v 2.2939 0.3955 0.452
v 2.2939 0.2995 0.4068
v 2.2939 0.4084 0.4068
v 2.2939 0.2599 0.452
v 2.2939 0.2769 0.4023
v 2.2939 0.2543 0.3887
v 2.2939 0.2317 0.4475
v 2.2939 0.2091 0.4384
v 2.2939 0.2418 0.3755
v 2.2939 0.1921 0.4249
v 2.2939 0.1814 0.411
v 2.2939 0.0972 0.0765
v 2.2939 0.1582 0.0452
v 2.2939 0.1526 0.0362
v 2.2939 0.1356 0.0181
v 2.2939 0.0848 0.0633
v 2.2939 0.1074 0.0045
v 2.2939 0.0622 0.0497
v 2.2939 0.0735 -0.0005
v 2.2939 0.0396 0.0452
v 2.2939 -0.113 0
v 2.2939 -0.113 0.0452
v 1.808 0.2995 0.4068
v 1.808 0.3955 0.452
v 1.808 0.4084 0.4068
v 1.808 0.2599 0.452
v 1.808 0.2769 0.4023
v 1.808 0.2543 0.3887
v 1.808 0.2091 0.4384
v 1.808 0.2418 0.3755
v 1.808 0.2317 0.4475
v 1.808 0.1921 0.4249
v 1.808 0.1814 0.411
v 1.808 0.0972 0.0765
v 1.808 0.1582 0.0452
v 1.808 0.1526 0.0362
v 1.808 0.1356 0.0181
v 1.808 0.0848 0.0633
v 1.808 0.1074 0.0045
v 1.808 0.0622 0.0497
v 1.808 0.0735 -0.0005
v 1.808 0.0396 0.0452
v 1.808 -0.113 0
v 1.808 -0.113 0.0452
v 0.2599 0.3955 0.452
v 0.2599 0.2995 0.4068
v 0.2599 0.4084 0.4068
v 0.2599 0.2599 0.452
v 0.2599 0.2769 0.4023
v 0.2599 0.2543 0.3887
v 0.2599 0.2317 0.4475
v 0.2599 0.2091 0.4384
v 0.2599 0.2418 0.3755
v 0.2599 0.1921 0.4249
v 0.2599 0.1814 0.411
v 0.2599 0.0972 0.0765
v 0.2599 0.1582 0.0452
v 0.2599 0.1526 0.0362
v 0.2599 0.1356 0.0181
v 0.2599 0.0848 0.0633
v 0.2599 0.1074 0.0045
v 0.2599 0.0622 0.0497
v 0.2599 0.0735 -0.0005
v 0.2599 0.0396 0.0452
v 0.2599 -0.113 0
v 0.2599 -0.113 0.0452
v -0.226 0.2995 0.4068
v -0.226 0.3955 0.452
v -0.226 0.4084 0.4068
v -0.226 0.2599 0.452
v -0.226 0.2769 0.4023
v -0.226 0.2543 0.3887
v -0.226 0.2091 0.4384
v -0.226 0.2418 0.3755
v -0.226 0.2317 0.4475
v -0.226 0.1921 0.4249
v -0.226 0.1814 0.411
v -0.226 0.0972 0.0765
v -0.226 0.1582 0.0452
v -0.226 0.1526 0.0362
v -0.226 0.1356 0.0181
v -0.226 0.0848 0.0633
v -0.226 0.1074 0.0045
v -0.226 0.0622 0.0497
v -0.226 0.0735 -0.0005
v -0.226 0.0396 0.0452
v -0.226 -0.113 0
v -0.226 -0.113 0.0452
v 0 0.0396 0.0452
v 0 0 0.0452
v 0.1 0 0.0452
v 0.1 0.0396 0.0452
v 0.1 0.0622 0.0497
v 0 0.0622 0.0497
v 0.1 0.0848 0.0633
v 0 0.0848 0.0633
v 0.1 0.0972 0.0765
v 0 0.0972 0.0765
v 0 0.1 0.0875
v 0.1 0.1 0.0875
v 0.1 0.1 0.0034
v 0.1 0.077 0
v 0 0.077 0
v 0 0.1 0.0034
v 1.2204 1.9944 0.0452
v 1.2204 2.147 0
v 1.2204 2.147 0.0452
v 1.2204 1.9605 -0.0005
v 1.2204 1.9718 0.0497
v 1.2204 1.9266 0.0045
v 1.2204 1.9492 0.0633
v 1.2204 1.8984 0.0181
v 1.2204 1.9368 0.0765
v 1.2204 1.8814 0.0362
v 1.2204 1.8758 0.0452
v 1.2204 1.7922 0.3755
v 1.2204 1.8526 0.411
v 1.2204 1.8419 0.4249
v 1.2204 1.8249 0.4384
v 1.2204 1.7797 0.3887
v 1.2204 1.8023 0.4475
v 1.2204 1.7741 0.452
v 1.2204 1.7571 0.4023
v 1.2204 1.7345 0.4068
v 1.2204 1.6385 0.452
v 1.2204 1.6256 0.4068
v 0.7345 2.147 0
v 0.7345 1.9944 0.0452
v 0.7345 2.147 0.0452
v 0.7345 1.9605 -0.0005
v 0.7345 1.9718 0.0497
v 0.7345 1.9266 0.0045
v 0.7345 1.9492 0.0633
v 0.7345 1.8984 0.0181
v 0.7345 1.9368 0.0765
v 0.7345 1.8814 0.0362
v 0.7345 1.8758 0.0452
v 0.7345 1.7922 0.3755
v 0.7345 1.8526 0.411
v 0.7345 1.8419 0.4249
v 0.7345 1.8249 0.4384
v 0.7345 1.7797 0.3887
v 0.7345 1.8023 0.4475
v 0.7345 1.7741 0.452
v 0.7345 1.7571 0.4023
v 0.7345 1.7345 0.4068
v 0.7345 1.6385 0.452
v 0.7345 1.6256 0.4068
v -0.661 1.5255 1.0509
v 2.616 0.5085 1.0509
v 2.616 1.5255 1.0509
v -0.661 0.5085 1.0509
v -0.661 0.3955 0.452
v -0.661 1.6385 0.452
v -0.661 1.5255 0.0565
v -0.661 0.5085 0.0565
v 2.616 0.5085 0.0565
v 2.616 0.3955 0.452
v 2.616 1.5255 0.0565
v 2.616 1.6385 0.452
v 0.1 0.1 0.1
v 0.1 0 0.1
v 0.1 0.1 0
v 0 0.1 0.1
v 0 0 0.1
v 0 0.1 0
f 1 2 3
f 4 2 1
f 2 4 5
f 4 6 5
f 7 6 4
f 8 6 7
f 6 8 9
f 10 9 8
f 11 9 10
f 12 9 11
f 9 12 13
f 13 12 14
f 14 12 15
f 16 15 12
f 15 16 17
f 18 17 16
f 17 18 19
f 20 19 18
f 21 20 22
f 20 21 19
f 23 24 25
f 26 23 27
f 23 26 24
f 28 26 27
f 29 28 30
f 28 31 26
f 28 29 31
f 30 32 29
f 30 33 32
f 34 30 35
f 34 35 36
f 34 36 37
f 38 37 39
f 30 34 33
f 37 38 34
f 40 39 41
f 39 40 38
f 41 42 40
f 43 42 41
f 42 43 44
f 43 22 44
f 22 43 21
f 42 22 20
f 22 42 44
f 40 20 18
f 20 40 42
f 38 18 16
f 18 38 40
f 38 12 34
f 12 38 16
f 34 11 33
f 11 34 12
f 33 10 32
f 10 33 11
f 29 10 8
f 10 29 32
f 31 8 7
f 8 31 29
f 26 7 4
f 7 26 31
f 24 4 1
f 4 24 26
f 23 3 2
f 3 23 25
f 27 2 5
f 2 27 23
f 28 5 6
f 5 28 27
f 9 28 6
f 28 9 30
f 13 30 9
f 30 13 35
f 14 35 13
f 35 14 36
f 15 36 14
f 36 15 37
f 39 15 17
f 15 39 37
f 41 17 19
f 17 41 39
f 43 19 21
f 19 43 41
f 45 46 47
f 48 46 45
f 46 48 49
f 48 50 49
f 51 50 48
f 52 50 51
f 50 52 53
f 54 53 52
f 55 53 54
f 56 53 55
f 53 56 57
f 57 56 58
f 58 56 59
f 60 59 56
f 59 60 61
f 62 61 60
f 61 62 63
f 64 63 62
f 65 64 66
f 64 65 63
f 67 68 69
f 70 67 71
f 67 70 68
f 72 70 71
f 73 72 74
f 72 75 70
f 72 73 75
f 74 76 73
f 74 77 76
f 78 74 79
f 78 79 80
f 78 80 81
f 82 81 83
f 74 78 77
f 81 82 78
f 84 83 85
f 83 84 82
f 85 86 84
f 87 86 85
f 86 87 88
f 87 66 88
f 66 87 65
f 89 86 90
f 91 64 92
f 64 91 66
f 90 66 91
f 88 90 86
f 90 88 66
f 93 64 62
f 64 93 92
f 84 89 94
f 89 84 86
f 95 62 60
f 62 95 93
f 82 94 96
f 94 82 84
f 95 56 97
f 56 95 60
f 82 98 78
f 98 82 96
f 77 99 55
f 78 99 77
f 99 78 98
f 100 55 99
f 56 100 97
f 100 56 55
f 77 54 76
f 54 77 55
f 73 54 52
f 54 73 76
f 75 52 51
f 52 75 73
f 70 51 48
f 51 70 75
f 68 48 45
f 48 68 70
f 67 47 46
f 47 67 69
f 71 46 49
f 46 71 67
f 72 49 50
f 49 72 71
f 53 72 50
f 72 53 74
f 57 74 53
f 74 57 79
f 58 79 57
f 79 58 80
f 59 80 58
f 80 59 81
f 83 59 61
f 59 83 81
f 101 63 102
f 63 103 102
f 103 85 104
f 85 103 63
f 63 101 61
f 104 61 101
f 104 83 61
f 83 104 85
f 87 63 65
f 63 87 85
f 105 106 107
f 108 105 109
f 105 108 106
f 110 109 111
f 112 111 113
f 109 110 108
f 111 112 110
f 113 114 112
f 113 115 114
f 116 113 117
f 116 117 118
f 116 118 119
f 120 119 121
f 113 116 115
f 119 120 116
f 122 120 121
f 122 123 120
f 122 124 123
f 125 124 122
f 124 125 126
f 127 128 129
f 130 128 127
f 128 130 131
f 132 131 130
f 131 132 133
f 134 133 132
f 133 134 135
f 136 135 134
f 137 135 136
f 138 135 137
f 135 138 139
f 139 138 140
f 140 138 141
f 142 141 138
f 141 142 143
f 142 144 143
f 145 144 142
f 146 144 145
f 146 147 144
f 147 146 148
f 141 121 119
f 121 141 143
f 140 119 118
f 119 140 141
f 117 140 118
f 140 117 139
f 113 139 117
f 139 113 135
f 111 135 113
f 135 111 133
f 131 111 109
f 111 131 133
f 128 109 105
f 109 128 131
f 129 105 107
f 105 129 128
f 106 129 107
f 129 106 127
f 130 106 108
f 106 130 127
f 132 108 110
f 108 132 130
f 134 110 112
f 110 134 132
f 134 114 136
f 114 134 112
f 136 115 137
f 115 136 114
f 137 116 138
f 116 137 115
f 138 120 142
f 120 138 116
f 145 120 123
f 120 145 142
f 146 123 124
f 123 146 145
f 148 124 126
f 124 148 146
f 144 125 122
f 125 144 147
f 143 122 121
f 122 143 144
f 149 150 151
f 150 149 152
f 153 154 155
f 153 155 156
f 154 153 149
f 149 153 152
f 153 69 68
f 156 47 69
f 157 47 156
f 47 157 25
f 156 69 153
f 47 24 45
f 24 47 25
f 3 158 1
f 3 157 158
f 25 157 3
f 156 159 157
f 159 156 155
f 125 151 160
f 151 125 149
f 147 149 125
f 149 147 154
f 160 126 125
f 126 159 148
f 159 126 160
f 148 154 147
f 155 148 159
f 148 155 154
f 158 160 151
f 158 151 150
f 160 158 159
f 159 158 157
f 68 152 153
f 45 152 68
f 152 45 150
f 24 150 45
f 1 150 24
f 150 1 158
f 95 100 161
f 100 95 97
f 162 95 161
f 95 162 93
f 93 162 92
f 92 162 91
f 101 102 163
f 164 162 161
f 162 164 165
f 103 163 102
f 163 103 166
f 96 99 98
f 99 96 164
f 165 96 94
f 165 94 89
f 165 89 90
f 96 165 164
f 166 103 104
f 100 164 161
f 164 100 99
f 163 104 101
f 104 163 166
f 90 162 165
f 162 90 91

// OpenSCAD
module sot23()
{

	// pin prototype
	module pin(length, height, thick)
	{
		linear_extrude(height=thick)
			scale([length, -height, 1])
				polygon([[0.3400,0.0000],[0.3900,0.0100],[0.4300,0.0300],[0.4600,0.0600],[0.4789,0.0908],[0.6279,0.8307],[0.6500,0.8600],[0.6900,0.8900],[0.7300,0.9000],[1.0000,0.9000],[1.0000,1.0000],[0.6700,1.0012],[0.6100,0.9900],[0.5600,0.9600],[0.5300,0.9200],[0.5200,0.9000],[0.3721,0.1693],[0.3500,0.1400],[0.3100,0.1100],[0.2700,0.1000],[0.0000,0.1000],[0.0000,0.0000]]);
	}

	rotate([90,0,-90]) scale([1.13,1.13,1.13]) translate([-0.9, 0.4, -2.1 - 0.43/2]) {
		// body
		color([0.1,0.1,0.1])
			linear_extrude(height=2.9)
				polygon([[-0.55,0],[-0.45,0.53],[0.45,0.53],[0.55,0],[0.45,-0.35],[-0.45,-0.35]]);

		// 3 pins
		color([0.9, 0.9, 0.9]) {
			translate([0.5,0,0.5-0.43/2])
				pin(0.5, 0.4, 0.43);

			translate([0.5,0,2.3-0.43/2])
				pin(0.5, 0.4, 0.43);

			translate([-0.5,0,1.45-0.43/2])
				pin(-0.5, 0.4, 0.43);
		}
	}
}


sot23();

cube([0.1,0.1,0.1]);
